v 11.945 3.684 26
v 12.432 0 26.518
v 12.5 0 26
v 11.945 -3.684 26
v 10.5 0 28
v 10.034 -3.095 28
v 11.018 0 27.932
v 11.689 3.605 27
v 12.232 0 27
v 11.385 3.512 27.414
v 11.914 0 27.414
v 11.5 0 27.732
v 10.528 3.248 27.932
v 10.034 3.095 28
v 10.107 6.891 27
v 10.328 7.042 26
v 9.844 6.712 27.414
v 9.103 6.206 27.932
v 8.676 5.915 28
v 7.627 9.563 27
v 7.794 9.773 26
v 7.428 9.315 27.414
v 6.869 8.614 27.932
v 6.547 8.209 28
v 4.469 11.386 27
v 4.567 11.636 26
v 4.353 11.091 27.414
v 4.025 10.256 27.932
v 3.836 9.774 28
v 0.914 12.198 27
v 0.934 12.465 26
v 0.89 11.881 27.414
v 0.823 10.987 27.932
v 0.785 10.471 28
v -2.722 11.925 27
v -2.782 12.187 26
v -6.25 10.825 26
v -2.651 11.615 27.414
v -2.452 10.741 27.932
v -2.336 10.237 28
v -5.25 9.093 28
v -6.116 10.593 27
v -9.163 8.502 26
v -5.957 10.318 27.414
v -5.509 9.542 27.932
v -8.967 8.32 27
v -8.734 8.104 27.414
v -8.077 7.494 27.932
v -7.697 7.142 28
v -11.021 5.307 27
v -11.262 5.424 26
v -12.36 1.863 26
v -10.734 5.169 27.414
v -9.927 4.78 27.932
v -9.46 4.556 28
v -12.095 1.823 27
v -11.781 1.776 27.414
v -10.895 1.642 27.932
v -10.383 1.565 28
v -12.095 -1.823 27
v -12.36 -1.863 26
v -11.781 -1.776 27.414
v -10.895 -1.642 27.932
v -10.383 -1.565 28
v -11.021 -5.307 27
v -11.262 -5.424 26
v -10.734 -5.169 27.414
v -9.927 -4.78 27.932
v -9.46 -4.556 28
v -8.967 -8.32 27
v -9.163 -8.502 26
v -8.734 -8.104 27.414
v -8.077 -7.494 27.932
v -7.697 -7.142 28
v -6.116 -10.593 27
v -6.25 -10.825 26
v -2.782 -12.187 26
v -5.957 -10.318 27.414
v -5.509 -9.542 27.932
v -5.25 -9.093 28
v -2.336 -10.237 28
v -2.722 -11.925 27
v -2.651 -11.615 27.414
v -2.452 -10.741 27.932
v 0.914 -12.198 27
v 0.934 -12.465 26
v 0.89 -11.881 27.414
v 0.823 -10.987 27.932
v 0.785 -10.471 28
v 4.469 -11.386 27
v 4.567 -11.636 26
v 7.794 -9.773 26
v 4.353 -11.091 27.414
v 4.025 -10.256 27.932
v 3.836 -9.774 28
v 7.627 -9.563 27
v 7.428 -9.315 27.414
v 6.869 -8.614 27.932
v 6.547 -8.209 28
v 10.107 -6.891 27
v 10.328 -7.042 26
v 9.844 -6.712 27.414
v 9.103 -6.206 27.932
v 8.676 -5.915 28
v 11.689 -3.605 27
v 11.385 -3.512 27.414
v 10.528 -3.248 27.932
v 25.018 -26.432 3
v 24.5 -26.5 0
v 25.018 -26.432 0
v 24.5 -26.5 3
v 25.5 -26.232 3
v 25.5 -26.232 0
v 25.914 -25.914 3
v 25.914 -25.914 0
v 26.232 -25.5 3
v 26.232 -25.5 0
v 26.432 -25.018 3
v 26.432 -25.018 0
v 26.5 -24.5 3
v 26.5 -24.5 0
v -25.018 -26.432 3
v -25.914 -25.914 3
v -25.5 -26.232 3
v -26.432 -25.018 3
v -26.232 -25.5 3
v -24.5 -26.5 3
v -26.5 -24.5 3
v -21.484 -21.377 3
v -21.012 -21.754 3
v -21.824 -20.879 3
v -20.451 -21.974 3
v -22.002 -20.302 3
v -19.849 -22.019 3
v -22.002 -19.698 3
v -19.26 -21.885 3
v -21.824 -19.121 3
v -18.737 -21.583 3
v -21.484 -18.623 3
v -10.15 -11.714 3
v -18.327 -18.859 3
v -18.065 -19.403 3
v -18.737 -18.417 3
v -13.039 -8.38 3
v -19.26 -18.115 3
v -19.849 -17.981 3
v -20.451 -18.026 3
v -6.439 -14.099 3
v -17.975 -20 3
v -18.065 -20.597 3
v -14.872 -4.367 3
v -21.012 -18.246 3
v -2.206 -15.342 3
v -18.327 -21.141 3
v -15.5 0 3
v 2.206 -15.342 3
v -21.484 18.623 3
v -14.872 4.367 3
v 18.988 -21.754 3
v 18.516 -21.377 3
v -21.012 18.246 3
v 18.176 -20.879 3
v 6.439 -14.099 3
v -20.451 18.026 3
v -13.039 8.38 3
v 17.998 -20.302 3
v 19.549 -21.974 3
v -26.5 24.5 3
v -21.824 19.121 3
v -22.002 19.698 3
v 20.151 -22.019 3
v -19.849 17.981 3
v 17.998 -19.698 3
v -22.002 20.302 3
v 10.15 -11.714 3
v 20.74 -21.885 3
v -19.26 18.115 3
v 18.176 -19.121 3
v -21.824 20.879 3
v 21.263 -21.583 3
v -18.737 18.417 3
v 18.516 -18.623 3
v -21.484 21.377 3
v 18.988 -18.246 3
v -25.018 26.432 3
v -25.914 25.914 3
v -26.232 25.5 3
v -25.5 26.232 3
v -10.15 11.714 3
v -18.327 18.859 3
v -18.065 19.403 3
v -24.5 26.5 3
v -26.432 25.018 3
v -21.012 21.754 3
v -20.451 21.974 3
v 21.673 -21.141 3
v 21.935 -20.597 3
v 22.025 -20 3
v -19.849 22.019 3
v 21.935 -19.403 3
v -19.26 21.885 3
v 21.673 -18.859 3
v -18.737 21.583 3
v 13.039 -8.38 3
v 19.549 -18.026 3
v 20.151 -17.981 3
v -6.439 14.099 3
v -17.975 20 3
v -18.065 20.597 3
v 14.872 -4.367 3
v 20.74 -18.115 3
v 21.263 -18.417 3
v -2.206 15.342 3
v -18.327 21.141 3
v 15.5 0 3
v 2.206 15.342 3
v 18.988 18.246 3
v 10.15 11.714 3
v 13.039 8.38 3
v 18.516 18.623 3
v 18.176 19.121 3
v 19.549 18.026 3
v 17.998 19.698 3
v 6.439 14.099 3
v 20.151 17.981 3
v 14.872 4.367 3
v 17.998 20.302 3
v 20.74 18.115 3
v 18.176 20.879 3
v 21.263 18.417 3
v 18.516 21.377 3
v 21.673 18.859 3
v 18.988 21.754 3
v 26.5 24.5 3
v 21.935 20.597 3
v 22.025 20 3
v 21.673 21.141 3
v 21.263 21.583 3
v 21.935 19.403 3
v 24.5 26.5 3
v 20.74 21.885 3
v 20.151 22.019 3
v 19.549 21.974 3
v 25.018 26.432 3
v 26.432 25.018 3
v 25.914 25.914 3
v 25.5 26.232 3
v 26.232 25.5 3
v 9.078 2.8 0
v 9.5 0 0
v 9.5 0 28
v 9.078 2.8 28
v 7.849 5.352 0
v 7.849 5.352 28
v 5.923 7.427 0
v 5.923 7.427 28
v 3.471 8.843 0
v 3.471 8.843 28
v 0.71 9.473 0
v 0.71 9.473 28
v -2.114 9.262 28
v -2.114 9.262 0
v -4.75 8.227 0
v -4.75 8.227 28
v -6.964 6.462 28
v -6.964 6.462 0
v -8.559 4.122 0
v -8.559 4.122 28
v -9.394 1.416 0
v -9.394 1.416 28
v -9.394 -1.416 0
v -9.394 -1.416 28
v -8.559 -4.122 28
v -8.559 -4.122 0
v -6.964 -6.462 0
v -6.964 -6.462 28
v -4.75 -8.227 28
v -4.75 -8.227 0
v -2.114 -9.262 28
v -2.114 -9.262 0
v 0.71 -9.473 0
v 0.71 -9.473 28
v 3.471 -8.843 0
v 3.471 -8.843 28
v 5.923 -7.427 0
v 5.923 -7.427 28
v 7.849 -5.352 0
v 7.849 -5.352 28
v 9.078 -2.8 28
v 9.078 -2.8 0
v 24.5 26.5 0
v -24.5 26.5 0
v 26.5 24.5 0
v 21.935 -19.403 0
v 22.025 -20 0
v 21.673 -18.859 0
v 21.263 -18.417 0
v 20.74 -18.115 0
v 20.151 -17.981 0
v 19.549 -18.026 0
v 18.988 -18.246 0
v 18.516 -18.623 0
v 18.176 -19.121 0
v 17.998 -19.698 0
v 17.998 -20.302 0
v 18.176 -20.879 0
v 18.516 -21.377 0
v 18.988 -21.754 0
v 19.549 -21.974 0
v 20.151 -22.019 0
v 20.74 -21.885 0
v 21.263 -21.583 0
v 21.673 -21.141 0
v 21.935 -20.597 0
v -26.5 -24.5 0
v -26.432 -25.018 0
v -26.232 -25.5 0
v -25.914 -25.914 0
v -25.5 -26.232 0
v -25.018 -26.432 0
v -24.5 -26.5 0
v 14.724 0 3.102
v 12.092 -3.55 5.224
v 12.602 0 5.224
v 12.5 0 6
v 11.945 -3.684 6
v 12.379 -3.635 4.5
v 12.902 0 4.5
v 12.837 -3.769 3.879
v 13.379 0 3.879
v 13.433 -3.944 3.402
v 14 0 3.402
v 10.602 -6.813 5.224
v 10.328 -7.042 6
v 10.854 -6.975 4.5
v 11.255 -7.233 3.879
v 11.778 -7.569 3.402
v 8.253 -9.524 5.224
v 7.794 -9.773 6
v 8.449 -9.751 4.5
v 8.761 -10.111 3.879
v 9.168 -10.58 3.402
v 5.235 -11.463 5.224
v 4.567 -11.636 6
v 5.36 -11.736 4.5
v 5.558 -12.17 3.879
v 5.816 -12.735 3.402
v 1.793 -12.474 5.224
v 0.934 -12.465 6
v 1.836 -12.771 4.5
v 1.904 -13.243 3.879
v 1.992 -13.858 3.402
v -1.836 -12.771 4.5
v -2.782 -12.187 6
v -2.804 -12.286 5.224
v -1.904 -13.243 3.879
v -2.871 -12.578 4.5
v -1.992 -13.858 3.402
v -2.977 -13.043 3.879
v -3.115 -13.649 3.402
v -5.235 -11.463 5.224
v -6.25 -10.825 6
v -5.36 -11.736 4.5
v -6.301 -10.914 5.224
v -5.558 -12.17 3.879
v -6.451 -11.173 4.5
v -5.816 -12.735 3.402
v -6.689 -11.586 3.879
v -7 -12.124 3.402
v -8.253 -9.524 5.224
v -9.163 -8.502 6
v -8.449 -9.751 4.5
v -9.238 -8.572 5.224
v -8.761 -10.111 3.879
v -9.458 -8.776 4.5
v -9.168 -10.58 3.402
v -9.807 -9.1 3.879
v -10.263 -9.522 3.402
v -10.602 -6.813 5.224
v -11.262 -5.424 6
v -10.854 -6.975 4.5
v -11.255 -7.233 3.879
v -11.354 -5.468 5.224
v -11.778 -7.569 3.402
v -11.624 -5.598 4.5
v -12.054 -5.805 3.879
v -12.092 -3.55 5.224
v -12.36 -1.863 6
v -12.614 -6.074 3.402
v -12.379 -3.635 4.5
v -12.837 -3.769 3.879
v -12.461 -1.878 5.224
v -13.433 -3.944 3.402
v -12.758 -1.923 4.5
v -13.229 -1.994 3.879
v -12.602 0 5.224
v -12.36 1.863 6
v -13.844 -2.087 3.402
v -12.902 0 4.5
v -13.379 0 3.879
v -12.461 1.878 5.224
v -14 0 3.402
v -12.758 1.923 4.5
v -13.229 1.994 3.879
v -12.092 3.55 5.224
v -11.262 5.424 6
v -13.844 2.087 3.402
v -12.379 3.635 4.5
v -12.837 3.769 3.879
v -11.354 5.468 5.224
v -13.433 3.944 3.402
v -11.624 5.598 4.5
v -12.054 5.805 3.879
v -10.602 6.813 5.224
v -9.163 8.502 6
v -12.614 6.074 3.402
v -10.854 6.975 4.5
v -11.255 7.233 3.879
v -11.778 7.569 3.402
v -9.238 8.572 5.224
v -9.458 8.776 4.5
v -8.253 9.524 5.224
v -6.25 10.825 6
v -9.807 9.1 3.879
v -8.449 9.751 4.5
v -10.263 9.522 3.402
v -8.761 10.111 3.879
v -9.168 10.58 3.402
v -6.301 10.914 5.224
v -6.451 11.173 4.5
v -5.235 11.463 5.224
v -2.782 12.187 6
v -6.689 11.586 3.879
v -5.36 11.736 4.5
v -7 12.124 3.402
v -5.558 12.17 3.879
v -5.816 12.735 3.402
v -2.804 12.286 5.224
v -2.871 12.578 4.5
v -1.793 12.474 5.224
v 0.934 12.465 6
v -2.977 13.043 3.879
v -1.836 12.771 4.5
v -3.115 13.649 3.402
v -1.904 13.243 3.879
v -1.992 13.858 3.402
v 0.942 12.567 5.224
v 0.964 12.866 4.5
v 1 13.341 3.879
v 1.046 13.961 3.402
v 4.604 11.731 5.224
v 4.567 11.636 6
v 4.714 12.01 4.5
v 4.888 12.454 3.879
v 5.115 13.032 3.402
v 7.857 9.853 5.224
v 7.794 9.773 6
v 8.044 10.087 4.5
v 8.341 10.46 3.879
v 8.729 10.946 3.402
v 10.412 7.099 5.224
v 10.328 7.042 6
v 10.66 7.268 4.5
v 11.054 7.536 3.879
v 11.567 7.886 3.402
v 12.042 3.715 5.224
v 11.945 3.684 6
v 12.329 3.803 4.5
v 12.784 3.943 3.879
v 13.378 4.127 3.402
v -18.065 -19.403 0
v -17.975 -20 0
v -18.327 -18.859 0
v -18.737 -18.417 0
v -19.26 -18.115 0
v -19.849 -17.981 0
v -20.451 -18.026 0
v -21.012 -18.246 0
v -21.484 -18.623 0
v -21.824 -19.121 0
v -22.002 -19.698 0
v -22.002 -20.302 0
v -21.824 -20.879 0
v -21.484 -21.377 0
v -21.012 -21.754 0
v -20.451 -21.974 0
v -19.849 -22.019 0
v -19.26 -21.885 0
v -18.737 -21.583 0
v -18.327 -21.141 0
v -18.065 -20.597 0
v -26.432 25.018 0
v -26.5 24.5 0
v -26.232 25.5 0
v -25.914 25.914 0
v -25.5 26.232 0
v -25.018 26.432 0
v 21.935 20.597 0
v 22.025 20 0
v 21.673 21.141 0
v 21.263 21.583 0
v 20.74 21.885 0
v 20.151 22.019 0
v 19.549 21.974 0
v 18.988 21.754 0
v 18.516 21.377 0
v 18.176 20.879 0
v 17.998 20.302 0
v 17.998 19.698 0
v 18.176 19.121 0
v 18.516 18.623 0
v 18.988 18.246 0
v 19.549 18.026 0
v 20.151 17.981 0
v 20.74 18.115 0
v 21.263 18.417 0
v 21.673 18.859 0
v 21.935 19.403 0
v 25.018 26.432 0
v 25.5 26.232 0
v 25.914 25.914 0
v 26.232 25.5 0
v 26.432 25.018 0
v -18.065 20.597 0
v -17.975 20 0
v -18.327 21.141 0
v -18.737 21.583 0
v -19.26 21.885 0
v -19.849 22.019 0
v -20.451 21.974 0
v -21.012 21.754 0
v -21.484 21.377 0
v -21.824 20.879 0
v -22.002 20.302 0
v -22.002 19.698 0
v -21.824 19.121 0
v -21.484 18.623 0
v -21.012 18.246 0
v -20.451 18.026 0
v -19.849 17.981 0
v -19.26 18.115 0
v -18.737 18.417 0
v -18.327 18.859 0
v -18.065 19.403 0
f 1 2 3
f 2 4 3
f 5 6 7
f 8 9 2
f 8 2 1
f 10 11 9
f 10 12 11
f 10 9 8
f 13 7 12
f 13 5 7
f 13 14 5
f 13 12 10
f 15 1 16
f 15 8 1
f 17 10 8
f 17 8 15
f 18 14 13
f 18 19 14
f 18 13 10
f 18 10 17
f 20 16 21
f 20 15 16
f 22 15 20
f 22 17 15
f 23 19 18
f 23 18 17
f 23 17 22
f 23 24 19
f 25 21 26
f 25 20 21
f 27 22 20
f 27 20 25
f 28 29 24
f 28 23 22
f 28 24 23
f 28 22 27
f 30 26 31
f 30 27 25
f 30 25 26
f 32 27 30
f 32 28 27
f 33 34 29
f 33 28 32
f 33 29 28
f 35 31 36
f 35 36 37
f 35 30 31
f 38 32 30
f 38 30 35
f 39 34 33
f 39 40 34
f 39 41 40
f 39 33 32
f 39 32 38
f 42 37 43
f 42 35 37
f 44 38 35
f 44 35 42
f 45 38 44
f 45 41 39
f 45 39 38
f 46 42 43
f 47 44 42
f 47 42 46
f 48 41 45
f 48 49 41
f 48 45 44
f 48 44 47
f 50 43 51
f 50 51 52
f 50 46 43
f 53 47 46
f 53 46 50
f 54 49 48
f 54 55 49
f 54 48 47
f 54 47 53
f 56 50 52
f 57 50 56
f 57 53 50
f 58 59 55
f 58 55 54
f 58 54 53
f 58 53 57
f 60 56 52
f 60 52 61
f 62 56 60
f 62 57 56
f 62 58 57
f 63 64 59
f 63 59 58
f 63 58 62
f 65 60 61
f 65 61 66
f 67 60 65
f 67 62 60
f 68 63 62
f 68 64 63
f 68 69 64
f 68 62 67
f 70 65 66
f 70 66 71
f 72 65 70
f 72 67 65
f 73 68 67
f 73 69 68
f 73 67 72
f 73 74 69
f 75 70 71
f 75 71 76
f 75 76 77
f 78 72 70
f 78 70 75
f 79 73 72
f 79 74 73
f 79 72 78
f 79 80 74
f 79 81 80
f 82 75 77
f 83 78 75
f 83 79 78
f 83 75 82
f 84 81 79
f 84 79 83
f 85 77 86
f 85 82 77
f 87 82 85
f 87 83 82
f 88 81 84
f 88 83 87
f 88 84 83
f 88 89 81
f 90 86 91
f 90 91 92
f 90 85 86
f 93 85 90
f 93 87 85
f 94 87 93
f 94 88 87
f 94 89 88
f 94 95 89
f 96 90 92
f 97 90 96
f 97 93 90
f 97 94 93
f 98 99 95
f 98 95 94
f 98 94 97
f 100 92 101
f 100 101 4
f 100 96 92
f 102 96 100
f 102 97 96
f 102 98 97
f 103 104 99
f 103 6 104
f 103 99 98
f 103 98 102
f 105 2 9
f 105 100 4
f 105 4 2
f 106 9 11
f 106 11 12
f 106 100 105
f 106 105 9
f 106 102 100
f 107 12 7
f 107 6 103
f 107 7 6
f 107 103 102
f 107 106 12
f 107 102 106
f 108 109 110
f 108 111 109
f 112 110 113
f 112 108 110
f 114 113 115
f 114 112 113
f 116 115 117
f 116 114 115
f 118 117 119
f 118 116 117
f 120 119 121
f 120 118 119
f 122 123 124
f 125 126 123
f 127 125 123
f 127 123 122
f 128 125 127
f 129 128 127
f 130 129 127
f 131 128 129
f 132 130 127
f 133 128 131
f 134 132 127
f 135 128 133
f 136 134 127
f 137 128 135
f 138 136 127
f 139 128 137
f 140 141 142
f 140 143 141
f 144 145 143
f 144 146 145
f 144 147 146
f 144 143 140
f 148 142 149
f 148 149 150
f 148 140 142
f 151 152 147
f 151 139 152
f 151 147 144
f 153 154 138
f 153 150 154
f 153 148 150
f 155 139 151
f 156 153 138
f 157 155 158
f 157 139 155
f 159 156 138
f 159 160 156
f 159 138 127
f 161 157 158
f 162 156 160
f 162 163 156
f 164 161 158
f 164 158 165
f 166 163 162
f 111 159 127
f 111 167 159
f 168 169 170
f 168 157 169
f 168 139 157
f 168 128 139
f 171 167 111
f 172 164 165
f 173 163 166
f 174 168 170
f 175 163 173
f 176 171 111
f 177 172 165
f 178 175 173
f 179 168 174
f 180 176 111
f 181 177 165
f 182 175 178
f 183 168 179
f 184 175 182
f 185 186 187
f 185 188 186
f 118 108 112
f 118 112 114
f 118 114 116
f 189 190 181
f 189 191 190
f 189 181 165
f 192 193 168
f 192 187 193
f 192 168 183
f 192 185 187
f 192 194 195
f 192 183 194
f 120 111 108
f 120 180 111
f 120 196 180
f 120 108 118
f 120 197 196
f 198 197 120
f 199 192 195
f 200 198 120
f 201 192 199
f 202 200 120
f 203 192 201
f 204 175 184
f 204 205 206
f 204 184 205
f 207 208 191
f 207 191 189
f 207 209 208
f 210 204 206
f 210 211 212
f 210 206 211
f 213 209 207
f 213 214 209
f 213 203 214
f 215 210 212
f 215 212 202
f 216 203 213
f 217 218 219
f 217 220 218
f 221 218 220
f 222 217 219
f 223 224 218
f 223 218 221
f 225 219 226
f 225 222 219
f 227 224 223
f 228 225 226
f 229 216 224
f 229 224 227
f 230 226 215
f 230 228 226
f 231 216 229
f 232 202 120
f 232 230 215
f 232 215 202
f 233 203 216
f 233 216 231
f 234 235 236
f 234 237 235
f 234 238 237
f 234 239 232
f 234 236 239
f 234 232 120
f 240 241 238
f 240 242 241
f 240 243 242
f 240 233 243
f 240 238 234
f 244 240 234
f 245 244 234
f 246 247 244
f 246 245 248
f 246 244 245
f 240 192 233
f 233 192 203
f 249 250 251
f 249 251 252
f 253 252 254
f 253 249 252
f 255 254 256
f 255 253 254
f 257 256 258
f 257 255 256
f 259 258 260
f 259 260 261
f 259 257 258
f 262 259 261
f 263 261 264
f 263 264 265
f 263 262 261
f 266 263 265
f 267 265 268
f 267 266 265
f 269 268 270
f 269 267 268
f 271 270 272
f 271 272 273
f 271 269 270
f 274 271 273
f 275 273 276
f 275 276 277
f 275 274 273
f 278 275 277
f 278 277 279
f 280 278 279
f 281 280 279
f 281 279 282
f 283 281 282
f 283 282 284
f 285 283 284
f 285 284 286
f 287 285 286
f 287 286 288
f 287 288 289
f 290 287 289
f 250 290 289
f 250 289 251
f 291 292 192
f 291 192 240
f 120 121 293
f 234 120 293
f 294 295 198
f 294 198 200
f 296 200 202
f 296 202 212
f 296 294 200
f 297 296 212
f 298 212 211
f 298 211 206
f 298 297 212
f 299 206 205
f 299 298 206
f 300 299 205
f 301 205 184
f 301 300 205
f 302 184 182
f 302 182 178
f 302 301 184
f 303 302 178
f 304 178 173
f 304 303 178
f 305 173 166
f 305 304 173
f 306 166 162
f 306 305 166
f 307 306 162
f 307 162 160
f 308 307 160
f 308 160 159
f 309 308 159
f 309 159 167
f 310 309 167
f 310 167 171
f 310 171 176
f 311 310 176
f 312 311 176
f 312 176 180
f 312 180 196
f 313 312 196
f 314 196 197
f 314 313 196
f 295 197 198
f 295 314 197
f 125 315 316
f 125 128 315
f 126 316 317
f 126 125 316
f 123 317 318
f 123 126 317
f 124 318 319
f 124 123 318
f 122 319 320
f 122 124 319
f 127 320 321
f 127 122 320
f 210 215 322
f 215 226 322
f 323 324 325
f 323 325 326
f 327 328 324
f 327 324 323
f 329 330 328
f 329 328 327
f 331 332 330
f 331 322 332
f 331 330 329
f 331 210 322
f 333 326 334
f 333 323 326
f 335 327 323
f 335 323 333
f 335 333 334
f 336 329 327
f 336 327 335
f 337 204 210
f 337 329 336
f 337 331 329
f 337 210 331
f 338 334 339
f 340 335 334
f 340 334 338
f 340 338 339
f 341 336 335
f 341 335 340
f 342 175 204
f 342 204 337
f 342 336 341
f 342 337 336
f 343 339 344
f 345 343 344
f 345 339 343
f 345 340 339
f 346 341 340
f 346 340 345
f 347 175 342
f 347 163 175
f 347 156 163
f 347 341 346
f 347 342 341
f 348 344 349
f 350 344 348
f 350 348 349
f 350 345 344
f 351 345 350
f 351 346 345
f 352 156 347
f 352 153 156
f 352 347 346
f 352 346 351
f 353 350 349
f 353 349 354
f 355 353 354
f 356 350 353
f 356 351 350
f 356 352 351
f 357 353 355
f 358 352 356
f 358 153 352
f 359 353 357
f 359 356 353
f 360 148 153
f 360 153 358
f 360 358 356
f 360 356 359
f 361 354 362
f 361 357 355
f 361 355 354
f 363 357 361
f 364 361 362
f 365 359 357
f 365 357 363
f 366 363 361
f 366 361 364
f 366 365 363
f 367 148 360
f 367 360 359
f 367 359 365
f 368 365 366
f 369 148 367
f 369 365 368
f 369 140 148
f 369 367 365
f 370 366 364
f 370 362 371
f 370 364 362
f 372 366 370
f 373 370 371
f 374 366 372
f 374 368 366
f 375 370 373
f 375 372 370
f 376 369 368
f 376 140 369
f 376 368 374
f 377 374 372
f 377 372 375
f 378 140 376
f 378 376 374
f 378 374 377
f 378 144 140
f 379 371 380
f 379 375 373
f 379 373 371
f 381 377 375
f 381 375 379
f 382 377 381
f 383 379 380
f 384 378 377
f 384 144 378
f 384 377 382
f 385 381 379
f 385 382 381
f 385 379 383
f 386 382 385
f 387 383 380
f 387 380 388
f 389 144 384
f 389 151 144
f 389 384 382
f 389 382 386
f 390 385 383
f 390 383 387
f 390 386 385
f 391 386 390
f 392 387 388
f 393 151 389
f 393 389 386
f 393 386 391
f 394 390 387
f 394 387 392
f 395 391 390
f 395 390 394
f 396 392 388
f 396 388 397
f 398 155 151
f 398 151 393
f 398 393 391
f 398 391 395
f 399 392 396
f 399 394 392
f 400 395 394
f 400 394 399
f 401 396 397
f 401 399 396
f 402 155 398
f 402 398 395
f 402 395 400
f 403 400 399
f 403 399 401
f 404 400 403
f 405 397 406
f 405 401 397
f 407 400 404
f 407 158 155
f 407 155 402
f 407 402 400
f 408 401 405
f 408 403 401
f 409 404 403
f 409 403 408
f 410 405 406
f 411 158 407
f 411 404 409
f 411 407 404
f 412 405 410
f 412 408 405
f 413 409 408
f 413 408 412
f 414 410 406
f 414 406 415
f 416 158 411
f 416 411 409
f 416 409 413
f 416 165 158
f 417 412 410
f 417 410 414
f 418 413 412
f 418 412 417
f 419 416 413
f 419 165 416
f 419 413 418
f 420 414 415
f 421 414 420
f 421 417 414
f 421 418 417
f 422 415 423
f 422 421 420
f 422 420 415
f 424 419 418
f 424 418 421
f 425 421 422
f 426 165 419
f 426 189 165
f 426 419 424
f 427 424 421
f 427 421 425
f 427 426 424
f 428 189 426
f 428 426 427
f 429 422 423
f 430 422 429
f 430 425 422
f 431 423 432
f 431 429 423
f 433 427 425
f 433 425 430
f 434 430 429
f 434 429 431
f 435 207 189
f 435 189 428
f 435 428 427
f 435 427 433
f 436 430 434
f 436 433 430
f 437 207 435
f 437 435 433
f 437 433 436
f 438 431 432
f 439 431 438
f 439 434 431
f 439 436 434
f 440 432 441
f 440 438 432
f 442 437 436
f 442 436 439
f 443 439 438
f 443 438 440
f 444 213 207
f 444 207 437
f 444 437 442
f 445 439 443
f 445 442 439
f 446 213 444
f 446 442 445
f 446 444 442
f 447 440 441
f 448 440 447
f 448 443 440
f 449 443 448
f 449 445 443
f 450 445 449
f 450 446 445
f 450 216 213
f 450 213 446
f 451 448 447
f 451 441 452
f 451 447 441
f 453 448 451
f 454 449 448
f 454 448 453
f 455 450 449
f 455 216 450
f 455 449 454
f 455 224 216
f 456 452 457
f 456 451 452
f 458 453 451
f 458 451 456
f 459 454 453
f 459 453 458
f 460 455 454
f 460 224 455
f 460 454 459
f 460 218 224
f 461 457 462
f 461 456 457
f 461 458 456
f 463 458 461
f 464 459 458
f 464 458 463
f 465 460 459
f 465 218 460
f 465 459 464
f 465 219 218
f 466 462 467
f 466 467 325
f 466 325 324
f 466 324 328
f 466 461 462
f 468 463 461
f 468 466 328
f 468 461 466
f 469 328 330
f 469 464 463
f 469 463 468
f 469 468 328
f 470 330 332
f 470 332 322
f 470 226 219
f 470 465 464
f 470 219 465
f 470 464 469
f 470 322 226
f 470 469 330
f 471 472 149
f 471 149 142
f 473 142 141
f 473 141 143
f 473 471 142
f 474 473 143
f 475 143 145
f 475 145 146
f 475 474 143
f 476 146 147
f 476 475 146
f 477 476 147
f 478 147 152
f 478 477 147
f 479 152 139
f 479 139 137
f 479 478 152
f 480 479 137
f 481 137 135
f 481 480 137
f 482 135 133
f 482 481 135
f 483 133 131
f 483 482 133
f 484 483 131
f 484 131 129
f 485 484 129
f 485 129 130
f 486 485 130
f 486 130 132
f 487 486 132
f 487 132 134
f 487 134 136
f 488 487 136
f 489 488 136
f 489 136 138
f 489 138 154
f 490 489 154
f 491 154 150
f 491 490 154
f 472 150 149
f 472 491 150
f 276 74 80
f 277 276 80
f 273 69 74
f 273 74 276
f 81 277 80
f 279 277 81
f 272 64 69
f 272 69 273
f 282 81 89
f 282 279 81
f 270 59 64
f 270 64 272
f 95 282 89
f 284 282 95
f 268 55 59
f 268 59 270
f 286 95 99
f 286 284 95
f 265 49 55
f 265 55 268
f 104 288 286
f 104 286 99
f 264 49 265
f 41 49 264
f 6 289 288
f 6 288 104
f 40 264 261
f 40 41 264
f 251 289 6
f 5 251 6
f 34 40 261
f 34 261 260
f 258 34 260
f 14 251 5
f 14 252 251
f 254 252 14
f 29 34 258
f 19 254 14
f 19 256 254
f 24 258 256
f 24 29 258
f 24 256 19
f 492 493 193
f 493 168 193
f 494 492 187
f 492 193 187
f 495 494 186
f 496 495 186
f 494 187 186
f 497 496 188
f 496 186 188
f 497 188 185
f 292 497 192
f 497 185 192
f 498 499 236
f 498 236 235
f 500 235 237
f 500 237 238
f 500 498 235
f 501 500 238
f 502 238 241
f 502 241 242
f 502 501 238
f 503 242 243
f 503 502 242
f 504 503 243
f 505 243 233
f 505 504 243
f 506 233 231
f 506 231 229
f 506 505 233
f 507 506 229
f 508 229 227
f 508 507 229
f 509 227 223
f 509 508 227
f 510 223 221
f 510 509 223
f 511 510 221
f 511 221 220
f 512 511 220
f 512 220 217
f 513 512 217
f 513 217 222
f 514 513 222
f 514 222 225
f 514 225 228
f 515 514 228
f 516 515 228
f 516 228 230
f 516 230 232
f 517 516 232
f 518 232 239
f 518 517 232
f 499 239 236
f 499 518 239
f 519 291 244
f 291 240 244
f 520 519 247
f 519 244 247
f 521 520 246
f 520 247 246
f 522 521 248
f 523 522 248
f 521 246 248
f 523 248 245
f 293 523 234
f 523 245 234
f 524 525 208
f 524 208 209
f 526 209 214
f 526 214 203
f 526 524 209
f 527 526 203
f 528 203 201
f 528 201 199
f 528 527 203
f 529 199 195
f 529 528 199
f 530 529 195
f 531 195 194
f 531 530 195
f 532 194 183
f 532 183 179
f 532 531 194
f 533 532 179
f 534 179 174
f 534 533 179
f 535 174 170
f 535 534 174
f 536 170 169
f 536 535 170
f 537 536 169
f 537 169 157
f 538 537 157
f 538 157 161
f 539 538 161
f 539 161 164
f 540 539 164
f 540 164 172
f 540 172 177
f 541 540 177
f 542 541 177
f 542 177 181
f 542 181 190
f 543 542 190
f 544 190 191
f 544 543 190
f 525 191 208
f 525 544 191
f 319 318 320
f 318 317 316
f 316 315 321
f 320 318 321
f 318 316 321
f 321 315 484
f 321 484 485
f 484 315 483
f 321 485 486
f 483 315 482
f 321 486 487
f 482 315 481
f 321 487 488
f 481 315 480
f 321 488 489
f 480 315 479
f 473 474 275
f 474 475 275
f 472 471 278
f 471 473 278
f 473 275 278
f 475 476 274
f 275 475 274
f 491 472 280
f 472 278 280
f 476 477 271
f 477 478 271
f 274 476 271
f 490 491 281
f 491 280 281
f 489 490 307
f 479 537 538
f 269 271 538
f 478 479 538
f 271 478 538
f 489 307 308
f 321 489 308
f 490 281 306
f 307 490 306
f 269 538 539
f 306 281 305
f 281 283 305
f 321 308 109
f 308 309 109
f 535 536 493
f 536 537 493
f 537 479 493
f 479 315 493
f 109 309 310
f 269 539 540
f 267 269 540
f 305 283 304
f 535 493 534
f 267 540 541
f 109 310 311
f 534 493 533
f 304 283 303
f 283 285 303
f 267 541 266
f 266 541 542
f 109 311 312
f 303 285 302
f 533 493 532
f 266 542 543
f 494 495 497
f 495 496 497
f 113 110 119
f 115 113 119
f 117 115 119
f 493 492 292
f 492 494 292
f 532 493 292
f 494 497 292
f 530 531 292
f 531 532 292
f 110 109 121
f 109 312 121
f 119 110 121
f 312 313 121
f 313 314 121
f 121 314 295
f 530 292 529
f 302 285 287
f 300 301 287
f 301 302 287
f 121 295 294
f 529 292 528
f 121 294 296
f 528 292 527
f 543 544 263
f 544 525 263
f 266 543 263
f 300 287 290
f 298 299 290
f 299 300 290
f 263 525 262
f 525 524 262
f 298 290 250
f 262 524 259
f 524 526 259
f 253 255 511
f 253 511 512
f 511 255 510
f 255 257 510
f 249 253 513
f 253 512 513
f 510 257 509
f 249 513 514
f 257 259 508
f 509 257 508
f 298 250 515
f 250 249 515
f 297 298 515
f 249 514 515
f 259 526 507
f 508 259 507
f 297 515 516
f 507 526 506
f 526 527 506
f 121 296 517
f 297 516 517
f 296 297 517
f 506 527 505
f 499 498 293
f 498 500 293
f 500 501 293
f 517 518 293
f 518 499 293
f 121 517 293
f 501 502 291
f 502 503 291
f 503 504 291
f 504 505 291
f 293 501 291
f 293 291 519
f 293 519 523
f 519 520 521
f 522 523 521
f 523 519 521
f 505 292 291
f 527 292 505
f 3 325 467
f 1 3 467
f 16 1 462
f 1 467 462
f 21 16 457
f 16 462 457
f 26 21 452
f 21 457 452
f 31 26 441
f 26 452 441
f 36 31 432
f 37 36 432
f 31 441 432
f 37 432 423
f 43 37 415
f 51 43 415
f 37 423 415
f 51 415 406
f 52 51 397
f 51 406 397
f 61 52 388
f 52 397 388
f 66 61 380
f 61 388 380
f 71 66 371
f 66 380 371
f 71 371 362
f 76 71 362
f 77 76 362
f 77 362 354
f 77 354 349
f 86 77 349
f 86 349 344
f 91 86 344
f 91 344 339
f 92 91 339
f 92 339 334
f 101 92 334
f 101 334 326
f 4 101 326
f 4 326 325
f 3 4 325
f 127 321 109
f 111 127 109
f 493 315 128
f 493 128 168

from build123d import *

# Parameters (mm, degrees)
F0_W     = 53
F0_H     = 53
F0_R     = 2.025
F0_R_2   = 12.5
F0_R_3   = 9.5
F1_DEPTH = 3
F2_DEPTH = 28
F3_R     = 2
F4_R     = 3
F5_R     = 2


with BuildPart() as f1:
    # F0 (on Top) → F1 (new body)
    with BuildSketch(Plane.XY):
        Rectangle(F0_W, F0_H)
        with Locations((-20, -20)):
            Circle(F0_R, mode=Mode.SUBTRACT)
        with Locations((20, -20)):
            Circle(F0_R, mode=Mode.SUBTRACT)
        with Locations((-20, 20)):
            Circle(F0_R, mode=Mode.SUBTRACT)
        Circle(F0_R_2, mode=Mode.SUBTRACT)
        with Locations((20, 20)):
            Circle(F0_R, mode=Mode.SUBTRACT)
        Circle(F0_R_2)
        Circle(F0_R_3, mode=Mode.SUBTRACT)
    extrude(amount=F1_DEPTH)

    # F0 (on Top) → F2 (join)
    with BuildSketch(Plane.XY):
        Circle(F0_R_2)
        Circle(F0_R_3, mode=Mode.SUBTRACT)
    extrude(amount=F2_DEPTH)

    # F3
    f3_edges = [f1.edges().sort_by_distance(p)[0] for p in [
        (-12.5, 0, 28),
    ]]
    fillet(f3_edges, radius=F3_R)

    # F4
    f4_edges = [f1.edges().sort_by_distance(p)[0] for p in [
        (-12.5, 0, 3),
    ]]
    fillet(f4_edges, radius=F4_R)

    # F5
    f5_edges = [f1.edges().sort_by_distance(p)[0] for p in [
        (-26.5, -26.5, 1.5),
        (26.5, -26.5, 1.5),
        (26.5, 26.5, 1.5),
        (-26.5, 26.5, 1.5),
    ]]
    fillet(f5_edges, radius=F5_R)


solid = f1.part
